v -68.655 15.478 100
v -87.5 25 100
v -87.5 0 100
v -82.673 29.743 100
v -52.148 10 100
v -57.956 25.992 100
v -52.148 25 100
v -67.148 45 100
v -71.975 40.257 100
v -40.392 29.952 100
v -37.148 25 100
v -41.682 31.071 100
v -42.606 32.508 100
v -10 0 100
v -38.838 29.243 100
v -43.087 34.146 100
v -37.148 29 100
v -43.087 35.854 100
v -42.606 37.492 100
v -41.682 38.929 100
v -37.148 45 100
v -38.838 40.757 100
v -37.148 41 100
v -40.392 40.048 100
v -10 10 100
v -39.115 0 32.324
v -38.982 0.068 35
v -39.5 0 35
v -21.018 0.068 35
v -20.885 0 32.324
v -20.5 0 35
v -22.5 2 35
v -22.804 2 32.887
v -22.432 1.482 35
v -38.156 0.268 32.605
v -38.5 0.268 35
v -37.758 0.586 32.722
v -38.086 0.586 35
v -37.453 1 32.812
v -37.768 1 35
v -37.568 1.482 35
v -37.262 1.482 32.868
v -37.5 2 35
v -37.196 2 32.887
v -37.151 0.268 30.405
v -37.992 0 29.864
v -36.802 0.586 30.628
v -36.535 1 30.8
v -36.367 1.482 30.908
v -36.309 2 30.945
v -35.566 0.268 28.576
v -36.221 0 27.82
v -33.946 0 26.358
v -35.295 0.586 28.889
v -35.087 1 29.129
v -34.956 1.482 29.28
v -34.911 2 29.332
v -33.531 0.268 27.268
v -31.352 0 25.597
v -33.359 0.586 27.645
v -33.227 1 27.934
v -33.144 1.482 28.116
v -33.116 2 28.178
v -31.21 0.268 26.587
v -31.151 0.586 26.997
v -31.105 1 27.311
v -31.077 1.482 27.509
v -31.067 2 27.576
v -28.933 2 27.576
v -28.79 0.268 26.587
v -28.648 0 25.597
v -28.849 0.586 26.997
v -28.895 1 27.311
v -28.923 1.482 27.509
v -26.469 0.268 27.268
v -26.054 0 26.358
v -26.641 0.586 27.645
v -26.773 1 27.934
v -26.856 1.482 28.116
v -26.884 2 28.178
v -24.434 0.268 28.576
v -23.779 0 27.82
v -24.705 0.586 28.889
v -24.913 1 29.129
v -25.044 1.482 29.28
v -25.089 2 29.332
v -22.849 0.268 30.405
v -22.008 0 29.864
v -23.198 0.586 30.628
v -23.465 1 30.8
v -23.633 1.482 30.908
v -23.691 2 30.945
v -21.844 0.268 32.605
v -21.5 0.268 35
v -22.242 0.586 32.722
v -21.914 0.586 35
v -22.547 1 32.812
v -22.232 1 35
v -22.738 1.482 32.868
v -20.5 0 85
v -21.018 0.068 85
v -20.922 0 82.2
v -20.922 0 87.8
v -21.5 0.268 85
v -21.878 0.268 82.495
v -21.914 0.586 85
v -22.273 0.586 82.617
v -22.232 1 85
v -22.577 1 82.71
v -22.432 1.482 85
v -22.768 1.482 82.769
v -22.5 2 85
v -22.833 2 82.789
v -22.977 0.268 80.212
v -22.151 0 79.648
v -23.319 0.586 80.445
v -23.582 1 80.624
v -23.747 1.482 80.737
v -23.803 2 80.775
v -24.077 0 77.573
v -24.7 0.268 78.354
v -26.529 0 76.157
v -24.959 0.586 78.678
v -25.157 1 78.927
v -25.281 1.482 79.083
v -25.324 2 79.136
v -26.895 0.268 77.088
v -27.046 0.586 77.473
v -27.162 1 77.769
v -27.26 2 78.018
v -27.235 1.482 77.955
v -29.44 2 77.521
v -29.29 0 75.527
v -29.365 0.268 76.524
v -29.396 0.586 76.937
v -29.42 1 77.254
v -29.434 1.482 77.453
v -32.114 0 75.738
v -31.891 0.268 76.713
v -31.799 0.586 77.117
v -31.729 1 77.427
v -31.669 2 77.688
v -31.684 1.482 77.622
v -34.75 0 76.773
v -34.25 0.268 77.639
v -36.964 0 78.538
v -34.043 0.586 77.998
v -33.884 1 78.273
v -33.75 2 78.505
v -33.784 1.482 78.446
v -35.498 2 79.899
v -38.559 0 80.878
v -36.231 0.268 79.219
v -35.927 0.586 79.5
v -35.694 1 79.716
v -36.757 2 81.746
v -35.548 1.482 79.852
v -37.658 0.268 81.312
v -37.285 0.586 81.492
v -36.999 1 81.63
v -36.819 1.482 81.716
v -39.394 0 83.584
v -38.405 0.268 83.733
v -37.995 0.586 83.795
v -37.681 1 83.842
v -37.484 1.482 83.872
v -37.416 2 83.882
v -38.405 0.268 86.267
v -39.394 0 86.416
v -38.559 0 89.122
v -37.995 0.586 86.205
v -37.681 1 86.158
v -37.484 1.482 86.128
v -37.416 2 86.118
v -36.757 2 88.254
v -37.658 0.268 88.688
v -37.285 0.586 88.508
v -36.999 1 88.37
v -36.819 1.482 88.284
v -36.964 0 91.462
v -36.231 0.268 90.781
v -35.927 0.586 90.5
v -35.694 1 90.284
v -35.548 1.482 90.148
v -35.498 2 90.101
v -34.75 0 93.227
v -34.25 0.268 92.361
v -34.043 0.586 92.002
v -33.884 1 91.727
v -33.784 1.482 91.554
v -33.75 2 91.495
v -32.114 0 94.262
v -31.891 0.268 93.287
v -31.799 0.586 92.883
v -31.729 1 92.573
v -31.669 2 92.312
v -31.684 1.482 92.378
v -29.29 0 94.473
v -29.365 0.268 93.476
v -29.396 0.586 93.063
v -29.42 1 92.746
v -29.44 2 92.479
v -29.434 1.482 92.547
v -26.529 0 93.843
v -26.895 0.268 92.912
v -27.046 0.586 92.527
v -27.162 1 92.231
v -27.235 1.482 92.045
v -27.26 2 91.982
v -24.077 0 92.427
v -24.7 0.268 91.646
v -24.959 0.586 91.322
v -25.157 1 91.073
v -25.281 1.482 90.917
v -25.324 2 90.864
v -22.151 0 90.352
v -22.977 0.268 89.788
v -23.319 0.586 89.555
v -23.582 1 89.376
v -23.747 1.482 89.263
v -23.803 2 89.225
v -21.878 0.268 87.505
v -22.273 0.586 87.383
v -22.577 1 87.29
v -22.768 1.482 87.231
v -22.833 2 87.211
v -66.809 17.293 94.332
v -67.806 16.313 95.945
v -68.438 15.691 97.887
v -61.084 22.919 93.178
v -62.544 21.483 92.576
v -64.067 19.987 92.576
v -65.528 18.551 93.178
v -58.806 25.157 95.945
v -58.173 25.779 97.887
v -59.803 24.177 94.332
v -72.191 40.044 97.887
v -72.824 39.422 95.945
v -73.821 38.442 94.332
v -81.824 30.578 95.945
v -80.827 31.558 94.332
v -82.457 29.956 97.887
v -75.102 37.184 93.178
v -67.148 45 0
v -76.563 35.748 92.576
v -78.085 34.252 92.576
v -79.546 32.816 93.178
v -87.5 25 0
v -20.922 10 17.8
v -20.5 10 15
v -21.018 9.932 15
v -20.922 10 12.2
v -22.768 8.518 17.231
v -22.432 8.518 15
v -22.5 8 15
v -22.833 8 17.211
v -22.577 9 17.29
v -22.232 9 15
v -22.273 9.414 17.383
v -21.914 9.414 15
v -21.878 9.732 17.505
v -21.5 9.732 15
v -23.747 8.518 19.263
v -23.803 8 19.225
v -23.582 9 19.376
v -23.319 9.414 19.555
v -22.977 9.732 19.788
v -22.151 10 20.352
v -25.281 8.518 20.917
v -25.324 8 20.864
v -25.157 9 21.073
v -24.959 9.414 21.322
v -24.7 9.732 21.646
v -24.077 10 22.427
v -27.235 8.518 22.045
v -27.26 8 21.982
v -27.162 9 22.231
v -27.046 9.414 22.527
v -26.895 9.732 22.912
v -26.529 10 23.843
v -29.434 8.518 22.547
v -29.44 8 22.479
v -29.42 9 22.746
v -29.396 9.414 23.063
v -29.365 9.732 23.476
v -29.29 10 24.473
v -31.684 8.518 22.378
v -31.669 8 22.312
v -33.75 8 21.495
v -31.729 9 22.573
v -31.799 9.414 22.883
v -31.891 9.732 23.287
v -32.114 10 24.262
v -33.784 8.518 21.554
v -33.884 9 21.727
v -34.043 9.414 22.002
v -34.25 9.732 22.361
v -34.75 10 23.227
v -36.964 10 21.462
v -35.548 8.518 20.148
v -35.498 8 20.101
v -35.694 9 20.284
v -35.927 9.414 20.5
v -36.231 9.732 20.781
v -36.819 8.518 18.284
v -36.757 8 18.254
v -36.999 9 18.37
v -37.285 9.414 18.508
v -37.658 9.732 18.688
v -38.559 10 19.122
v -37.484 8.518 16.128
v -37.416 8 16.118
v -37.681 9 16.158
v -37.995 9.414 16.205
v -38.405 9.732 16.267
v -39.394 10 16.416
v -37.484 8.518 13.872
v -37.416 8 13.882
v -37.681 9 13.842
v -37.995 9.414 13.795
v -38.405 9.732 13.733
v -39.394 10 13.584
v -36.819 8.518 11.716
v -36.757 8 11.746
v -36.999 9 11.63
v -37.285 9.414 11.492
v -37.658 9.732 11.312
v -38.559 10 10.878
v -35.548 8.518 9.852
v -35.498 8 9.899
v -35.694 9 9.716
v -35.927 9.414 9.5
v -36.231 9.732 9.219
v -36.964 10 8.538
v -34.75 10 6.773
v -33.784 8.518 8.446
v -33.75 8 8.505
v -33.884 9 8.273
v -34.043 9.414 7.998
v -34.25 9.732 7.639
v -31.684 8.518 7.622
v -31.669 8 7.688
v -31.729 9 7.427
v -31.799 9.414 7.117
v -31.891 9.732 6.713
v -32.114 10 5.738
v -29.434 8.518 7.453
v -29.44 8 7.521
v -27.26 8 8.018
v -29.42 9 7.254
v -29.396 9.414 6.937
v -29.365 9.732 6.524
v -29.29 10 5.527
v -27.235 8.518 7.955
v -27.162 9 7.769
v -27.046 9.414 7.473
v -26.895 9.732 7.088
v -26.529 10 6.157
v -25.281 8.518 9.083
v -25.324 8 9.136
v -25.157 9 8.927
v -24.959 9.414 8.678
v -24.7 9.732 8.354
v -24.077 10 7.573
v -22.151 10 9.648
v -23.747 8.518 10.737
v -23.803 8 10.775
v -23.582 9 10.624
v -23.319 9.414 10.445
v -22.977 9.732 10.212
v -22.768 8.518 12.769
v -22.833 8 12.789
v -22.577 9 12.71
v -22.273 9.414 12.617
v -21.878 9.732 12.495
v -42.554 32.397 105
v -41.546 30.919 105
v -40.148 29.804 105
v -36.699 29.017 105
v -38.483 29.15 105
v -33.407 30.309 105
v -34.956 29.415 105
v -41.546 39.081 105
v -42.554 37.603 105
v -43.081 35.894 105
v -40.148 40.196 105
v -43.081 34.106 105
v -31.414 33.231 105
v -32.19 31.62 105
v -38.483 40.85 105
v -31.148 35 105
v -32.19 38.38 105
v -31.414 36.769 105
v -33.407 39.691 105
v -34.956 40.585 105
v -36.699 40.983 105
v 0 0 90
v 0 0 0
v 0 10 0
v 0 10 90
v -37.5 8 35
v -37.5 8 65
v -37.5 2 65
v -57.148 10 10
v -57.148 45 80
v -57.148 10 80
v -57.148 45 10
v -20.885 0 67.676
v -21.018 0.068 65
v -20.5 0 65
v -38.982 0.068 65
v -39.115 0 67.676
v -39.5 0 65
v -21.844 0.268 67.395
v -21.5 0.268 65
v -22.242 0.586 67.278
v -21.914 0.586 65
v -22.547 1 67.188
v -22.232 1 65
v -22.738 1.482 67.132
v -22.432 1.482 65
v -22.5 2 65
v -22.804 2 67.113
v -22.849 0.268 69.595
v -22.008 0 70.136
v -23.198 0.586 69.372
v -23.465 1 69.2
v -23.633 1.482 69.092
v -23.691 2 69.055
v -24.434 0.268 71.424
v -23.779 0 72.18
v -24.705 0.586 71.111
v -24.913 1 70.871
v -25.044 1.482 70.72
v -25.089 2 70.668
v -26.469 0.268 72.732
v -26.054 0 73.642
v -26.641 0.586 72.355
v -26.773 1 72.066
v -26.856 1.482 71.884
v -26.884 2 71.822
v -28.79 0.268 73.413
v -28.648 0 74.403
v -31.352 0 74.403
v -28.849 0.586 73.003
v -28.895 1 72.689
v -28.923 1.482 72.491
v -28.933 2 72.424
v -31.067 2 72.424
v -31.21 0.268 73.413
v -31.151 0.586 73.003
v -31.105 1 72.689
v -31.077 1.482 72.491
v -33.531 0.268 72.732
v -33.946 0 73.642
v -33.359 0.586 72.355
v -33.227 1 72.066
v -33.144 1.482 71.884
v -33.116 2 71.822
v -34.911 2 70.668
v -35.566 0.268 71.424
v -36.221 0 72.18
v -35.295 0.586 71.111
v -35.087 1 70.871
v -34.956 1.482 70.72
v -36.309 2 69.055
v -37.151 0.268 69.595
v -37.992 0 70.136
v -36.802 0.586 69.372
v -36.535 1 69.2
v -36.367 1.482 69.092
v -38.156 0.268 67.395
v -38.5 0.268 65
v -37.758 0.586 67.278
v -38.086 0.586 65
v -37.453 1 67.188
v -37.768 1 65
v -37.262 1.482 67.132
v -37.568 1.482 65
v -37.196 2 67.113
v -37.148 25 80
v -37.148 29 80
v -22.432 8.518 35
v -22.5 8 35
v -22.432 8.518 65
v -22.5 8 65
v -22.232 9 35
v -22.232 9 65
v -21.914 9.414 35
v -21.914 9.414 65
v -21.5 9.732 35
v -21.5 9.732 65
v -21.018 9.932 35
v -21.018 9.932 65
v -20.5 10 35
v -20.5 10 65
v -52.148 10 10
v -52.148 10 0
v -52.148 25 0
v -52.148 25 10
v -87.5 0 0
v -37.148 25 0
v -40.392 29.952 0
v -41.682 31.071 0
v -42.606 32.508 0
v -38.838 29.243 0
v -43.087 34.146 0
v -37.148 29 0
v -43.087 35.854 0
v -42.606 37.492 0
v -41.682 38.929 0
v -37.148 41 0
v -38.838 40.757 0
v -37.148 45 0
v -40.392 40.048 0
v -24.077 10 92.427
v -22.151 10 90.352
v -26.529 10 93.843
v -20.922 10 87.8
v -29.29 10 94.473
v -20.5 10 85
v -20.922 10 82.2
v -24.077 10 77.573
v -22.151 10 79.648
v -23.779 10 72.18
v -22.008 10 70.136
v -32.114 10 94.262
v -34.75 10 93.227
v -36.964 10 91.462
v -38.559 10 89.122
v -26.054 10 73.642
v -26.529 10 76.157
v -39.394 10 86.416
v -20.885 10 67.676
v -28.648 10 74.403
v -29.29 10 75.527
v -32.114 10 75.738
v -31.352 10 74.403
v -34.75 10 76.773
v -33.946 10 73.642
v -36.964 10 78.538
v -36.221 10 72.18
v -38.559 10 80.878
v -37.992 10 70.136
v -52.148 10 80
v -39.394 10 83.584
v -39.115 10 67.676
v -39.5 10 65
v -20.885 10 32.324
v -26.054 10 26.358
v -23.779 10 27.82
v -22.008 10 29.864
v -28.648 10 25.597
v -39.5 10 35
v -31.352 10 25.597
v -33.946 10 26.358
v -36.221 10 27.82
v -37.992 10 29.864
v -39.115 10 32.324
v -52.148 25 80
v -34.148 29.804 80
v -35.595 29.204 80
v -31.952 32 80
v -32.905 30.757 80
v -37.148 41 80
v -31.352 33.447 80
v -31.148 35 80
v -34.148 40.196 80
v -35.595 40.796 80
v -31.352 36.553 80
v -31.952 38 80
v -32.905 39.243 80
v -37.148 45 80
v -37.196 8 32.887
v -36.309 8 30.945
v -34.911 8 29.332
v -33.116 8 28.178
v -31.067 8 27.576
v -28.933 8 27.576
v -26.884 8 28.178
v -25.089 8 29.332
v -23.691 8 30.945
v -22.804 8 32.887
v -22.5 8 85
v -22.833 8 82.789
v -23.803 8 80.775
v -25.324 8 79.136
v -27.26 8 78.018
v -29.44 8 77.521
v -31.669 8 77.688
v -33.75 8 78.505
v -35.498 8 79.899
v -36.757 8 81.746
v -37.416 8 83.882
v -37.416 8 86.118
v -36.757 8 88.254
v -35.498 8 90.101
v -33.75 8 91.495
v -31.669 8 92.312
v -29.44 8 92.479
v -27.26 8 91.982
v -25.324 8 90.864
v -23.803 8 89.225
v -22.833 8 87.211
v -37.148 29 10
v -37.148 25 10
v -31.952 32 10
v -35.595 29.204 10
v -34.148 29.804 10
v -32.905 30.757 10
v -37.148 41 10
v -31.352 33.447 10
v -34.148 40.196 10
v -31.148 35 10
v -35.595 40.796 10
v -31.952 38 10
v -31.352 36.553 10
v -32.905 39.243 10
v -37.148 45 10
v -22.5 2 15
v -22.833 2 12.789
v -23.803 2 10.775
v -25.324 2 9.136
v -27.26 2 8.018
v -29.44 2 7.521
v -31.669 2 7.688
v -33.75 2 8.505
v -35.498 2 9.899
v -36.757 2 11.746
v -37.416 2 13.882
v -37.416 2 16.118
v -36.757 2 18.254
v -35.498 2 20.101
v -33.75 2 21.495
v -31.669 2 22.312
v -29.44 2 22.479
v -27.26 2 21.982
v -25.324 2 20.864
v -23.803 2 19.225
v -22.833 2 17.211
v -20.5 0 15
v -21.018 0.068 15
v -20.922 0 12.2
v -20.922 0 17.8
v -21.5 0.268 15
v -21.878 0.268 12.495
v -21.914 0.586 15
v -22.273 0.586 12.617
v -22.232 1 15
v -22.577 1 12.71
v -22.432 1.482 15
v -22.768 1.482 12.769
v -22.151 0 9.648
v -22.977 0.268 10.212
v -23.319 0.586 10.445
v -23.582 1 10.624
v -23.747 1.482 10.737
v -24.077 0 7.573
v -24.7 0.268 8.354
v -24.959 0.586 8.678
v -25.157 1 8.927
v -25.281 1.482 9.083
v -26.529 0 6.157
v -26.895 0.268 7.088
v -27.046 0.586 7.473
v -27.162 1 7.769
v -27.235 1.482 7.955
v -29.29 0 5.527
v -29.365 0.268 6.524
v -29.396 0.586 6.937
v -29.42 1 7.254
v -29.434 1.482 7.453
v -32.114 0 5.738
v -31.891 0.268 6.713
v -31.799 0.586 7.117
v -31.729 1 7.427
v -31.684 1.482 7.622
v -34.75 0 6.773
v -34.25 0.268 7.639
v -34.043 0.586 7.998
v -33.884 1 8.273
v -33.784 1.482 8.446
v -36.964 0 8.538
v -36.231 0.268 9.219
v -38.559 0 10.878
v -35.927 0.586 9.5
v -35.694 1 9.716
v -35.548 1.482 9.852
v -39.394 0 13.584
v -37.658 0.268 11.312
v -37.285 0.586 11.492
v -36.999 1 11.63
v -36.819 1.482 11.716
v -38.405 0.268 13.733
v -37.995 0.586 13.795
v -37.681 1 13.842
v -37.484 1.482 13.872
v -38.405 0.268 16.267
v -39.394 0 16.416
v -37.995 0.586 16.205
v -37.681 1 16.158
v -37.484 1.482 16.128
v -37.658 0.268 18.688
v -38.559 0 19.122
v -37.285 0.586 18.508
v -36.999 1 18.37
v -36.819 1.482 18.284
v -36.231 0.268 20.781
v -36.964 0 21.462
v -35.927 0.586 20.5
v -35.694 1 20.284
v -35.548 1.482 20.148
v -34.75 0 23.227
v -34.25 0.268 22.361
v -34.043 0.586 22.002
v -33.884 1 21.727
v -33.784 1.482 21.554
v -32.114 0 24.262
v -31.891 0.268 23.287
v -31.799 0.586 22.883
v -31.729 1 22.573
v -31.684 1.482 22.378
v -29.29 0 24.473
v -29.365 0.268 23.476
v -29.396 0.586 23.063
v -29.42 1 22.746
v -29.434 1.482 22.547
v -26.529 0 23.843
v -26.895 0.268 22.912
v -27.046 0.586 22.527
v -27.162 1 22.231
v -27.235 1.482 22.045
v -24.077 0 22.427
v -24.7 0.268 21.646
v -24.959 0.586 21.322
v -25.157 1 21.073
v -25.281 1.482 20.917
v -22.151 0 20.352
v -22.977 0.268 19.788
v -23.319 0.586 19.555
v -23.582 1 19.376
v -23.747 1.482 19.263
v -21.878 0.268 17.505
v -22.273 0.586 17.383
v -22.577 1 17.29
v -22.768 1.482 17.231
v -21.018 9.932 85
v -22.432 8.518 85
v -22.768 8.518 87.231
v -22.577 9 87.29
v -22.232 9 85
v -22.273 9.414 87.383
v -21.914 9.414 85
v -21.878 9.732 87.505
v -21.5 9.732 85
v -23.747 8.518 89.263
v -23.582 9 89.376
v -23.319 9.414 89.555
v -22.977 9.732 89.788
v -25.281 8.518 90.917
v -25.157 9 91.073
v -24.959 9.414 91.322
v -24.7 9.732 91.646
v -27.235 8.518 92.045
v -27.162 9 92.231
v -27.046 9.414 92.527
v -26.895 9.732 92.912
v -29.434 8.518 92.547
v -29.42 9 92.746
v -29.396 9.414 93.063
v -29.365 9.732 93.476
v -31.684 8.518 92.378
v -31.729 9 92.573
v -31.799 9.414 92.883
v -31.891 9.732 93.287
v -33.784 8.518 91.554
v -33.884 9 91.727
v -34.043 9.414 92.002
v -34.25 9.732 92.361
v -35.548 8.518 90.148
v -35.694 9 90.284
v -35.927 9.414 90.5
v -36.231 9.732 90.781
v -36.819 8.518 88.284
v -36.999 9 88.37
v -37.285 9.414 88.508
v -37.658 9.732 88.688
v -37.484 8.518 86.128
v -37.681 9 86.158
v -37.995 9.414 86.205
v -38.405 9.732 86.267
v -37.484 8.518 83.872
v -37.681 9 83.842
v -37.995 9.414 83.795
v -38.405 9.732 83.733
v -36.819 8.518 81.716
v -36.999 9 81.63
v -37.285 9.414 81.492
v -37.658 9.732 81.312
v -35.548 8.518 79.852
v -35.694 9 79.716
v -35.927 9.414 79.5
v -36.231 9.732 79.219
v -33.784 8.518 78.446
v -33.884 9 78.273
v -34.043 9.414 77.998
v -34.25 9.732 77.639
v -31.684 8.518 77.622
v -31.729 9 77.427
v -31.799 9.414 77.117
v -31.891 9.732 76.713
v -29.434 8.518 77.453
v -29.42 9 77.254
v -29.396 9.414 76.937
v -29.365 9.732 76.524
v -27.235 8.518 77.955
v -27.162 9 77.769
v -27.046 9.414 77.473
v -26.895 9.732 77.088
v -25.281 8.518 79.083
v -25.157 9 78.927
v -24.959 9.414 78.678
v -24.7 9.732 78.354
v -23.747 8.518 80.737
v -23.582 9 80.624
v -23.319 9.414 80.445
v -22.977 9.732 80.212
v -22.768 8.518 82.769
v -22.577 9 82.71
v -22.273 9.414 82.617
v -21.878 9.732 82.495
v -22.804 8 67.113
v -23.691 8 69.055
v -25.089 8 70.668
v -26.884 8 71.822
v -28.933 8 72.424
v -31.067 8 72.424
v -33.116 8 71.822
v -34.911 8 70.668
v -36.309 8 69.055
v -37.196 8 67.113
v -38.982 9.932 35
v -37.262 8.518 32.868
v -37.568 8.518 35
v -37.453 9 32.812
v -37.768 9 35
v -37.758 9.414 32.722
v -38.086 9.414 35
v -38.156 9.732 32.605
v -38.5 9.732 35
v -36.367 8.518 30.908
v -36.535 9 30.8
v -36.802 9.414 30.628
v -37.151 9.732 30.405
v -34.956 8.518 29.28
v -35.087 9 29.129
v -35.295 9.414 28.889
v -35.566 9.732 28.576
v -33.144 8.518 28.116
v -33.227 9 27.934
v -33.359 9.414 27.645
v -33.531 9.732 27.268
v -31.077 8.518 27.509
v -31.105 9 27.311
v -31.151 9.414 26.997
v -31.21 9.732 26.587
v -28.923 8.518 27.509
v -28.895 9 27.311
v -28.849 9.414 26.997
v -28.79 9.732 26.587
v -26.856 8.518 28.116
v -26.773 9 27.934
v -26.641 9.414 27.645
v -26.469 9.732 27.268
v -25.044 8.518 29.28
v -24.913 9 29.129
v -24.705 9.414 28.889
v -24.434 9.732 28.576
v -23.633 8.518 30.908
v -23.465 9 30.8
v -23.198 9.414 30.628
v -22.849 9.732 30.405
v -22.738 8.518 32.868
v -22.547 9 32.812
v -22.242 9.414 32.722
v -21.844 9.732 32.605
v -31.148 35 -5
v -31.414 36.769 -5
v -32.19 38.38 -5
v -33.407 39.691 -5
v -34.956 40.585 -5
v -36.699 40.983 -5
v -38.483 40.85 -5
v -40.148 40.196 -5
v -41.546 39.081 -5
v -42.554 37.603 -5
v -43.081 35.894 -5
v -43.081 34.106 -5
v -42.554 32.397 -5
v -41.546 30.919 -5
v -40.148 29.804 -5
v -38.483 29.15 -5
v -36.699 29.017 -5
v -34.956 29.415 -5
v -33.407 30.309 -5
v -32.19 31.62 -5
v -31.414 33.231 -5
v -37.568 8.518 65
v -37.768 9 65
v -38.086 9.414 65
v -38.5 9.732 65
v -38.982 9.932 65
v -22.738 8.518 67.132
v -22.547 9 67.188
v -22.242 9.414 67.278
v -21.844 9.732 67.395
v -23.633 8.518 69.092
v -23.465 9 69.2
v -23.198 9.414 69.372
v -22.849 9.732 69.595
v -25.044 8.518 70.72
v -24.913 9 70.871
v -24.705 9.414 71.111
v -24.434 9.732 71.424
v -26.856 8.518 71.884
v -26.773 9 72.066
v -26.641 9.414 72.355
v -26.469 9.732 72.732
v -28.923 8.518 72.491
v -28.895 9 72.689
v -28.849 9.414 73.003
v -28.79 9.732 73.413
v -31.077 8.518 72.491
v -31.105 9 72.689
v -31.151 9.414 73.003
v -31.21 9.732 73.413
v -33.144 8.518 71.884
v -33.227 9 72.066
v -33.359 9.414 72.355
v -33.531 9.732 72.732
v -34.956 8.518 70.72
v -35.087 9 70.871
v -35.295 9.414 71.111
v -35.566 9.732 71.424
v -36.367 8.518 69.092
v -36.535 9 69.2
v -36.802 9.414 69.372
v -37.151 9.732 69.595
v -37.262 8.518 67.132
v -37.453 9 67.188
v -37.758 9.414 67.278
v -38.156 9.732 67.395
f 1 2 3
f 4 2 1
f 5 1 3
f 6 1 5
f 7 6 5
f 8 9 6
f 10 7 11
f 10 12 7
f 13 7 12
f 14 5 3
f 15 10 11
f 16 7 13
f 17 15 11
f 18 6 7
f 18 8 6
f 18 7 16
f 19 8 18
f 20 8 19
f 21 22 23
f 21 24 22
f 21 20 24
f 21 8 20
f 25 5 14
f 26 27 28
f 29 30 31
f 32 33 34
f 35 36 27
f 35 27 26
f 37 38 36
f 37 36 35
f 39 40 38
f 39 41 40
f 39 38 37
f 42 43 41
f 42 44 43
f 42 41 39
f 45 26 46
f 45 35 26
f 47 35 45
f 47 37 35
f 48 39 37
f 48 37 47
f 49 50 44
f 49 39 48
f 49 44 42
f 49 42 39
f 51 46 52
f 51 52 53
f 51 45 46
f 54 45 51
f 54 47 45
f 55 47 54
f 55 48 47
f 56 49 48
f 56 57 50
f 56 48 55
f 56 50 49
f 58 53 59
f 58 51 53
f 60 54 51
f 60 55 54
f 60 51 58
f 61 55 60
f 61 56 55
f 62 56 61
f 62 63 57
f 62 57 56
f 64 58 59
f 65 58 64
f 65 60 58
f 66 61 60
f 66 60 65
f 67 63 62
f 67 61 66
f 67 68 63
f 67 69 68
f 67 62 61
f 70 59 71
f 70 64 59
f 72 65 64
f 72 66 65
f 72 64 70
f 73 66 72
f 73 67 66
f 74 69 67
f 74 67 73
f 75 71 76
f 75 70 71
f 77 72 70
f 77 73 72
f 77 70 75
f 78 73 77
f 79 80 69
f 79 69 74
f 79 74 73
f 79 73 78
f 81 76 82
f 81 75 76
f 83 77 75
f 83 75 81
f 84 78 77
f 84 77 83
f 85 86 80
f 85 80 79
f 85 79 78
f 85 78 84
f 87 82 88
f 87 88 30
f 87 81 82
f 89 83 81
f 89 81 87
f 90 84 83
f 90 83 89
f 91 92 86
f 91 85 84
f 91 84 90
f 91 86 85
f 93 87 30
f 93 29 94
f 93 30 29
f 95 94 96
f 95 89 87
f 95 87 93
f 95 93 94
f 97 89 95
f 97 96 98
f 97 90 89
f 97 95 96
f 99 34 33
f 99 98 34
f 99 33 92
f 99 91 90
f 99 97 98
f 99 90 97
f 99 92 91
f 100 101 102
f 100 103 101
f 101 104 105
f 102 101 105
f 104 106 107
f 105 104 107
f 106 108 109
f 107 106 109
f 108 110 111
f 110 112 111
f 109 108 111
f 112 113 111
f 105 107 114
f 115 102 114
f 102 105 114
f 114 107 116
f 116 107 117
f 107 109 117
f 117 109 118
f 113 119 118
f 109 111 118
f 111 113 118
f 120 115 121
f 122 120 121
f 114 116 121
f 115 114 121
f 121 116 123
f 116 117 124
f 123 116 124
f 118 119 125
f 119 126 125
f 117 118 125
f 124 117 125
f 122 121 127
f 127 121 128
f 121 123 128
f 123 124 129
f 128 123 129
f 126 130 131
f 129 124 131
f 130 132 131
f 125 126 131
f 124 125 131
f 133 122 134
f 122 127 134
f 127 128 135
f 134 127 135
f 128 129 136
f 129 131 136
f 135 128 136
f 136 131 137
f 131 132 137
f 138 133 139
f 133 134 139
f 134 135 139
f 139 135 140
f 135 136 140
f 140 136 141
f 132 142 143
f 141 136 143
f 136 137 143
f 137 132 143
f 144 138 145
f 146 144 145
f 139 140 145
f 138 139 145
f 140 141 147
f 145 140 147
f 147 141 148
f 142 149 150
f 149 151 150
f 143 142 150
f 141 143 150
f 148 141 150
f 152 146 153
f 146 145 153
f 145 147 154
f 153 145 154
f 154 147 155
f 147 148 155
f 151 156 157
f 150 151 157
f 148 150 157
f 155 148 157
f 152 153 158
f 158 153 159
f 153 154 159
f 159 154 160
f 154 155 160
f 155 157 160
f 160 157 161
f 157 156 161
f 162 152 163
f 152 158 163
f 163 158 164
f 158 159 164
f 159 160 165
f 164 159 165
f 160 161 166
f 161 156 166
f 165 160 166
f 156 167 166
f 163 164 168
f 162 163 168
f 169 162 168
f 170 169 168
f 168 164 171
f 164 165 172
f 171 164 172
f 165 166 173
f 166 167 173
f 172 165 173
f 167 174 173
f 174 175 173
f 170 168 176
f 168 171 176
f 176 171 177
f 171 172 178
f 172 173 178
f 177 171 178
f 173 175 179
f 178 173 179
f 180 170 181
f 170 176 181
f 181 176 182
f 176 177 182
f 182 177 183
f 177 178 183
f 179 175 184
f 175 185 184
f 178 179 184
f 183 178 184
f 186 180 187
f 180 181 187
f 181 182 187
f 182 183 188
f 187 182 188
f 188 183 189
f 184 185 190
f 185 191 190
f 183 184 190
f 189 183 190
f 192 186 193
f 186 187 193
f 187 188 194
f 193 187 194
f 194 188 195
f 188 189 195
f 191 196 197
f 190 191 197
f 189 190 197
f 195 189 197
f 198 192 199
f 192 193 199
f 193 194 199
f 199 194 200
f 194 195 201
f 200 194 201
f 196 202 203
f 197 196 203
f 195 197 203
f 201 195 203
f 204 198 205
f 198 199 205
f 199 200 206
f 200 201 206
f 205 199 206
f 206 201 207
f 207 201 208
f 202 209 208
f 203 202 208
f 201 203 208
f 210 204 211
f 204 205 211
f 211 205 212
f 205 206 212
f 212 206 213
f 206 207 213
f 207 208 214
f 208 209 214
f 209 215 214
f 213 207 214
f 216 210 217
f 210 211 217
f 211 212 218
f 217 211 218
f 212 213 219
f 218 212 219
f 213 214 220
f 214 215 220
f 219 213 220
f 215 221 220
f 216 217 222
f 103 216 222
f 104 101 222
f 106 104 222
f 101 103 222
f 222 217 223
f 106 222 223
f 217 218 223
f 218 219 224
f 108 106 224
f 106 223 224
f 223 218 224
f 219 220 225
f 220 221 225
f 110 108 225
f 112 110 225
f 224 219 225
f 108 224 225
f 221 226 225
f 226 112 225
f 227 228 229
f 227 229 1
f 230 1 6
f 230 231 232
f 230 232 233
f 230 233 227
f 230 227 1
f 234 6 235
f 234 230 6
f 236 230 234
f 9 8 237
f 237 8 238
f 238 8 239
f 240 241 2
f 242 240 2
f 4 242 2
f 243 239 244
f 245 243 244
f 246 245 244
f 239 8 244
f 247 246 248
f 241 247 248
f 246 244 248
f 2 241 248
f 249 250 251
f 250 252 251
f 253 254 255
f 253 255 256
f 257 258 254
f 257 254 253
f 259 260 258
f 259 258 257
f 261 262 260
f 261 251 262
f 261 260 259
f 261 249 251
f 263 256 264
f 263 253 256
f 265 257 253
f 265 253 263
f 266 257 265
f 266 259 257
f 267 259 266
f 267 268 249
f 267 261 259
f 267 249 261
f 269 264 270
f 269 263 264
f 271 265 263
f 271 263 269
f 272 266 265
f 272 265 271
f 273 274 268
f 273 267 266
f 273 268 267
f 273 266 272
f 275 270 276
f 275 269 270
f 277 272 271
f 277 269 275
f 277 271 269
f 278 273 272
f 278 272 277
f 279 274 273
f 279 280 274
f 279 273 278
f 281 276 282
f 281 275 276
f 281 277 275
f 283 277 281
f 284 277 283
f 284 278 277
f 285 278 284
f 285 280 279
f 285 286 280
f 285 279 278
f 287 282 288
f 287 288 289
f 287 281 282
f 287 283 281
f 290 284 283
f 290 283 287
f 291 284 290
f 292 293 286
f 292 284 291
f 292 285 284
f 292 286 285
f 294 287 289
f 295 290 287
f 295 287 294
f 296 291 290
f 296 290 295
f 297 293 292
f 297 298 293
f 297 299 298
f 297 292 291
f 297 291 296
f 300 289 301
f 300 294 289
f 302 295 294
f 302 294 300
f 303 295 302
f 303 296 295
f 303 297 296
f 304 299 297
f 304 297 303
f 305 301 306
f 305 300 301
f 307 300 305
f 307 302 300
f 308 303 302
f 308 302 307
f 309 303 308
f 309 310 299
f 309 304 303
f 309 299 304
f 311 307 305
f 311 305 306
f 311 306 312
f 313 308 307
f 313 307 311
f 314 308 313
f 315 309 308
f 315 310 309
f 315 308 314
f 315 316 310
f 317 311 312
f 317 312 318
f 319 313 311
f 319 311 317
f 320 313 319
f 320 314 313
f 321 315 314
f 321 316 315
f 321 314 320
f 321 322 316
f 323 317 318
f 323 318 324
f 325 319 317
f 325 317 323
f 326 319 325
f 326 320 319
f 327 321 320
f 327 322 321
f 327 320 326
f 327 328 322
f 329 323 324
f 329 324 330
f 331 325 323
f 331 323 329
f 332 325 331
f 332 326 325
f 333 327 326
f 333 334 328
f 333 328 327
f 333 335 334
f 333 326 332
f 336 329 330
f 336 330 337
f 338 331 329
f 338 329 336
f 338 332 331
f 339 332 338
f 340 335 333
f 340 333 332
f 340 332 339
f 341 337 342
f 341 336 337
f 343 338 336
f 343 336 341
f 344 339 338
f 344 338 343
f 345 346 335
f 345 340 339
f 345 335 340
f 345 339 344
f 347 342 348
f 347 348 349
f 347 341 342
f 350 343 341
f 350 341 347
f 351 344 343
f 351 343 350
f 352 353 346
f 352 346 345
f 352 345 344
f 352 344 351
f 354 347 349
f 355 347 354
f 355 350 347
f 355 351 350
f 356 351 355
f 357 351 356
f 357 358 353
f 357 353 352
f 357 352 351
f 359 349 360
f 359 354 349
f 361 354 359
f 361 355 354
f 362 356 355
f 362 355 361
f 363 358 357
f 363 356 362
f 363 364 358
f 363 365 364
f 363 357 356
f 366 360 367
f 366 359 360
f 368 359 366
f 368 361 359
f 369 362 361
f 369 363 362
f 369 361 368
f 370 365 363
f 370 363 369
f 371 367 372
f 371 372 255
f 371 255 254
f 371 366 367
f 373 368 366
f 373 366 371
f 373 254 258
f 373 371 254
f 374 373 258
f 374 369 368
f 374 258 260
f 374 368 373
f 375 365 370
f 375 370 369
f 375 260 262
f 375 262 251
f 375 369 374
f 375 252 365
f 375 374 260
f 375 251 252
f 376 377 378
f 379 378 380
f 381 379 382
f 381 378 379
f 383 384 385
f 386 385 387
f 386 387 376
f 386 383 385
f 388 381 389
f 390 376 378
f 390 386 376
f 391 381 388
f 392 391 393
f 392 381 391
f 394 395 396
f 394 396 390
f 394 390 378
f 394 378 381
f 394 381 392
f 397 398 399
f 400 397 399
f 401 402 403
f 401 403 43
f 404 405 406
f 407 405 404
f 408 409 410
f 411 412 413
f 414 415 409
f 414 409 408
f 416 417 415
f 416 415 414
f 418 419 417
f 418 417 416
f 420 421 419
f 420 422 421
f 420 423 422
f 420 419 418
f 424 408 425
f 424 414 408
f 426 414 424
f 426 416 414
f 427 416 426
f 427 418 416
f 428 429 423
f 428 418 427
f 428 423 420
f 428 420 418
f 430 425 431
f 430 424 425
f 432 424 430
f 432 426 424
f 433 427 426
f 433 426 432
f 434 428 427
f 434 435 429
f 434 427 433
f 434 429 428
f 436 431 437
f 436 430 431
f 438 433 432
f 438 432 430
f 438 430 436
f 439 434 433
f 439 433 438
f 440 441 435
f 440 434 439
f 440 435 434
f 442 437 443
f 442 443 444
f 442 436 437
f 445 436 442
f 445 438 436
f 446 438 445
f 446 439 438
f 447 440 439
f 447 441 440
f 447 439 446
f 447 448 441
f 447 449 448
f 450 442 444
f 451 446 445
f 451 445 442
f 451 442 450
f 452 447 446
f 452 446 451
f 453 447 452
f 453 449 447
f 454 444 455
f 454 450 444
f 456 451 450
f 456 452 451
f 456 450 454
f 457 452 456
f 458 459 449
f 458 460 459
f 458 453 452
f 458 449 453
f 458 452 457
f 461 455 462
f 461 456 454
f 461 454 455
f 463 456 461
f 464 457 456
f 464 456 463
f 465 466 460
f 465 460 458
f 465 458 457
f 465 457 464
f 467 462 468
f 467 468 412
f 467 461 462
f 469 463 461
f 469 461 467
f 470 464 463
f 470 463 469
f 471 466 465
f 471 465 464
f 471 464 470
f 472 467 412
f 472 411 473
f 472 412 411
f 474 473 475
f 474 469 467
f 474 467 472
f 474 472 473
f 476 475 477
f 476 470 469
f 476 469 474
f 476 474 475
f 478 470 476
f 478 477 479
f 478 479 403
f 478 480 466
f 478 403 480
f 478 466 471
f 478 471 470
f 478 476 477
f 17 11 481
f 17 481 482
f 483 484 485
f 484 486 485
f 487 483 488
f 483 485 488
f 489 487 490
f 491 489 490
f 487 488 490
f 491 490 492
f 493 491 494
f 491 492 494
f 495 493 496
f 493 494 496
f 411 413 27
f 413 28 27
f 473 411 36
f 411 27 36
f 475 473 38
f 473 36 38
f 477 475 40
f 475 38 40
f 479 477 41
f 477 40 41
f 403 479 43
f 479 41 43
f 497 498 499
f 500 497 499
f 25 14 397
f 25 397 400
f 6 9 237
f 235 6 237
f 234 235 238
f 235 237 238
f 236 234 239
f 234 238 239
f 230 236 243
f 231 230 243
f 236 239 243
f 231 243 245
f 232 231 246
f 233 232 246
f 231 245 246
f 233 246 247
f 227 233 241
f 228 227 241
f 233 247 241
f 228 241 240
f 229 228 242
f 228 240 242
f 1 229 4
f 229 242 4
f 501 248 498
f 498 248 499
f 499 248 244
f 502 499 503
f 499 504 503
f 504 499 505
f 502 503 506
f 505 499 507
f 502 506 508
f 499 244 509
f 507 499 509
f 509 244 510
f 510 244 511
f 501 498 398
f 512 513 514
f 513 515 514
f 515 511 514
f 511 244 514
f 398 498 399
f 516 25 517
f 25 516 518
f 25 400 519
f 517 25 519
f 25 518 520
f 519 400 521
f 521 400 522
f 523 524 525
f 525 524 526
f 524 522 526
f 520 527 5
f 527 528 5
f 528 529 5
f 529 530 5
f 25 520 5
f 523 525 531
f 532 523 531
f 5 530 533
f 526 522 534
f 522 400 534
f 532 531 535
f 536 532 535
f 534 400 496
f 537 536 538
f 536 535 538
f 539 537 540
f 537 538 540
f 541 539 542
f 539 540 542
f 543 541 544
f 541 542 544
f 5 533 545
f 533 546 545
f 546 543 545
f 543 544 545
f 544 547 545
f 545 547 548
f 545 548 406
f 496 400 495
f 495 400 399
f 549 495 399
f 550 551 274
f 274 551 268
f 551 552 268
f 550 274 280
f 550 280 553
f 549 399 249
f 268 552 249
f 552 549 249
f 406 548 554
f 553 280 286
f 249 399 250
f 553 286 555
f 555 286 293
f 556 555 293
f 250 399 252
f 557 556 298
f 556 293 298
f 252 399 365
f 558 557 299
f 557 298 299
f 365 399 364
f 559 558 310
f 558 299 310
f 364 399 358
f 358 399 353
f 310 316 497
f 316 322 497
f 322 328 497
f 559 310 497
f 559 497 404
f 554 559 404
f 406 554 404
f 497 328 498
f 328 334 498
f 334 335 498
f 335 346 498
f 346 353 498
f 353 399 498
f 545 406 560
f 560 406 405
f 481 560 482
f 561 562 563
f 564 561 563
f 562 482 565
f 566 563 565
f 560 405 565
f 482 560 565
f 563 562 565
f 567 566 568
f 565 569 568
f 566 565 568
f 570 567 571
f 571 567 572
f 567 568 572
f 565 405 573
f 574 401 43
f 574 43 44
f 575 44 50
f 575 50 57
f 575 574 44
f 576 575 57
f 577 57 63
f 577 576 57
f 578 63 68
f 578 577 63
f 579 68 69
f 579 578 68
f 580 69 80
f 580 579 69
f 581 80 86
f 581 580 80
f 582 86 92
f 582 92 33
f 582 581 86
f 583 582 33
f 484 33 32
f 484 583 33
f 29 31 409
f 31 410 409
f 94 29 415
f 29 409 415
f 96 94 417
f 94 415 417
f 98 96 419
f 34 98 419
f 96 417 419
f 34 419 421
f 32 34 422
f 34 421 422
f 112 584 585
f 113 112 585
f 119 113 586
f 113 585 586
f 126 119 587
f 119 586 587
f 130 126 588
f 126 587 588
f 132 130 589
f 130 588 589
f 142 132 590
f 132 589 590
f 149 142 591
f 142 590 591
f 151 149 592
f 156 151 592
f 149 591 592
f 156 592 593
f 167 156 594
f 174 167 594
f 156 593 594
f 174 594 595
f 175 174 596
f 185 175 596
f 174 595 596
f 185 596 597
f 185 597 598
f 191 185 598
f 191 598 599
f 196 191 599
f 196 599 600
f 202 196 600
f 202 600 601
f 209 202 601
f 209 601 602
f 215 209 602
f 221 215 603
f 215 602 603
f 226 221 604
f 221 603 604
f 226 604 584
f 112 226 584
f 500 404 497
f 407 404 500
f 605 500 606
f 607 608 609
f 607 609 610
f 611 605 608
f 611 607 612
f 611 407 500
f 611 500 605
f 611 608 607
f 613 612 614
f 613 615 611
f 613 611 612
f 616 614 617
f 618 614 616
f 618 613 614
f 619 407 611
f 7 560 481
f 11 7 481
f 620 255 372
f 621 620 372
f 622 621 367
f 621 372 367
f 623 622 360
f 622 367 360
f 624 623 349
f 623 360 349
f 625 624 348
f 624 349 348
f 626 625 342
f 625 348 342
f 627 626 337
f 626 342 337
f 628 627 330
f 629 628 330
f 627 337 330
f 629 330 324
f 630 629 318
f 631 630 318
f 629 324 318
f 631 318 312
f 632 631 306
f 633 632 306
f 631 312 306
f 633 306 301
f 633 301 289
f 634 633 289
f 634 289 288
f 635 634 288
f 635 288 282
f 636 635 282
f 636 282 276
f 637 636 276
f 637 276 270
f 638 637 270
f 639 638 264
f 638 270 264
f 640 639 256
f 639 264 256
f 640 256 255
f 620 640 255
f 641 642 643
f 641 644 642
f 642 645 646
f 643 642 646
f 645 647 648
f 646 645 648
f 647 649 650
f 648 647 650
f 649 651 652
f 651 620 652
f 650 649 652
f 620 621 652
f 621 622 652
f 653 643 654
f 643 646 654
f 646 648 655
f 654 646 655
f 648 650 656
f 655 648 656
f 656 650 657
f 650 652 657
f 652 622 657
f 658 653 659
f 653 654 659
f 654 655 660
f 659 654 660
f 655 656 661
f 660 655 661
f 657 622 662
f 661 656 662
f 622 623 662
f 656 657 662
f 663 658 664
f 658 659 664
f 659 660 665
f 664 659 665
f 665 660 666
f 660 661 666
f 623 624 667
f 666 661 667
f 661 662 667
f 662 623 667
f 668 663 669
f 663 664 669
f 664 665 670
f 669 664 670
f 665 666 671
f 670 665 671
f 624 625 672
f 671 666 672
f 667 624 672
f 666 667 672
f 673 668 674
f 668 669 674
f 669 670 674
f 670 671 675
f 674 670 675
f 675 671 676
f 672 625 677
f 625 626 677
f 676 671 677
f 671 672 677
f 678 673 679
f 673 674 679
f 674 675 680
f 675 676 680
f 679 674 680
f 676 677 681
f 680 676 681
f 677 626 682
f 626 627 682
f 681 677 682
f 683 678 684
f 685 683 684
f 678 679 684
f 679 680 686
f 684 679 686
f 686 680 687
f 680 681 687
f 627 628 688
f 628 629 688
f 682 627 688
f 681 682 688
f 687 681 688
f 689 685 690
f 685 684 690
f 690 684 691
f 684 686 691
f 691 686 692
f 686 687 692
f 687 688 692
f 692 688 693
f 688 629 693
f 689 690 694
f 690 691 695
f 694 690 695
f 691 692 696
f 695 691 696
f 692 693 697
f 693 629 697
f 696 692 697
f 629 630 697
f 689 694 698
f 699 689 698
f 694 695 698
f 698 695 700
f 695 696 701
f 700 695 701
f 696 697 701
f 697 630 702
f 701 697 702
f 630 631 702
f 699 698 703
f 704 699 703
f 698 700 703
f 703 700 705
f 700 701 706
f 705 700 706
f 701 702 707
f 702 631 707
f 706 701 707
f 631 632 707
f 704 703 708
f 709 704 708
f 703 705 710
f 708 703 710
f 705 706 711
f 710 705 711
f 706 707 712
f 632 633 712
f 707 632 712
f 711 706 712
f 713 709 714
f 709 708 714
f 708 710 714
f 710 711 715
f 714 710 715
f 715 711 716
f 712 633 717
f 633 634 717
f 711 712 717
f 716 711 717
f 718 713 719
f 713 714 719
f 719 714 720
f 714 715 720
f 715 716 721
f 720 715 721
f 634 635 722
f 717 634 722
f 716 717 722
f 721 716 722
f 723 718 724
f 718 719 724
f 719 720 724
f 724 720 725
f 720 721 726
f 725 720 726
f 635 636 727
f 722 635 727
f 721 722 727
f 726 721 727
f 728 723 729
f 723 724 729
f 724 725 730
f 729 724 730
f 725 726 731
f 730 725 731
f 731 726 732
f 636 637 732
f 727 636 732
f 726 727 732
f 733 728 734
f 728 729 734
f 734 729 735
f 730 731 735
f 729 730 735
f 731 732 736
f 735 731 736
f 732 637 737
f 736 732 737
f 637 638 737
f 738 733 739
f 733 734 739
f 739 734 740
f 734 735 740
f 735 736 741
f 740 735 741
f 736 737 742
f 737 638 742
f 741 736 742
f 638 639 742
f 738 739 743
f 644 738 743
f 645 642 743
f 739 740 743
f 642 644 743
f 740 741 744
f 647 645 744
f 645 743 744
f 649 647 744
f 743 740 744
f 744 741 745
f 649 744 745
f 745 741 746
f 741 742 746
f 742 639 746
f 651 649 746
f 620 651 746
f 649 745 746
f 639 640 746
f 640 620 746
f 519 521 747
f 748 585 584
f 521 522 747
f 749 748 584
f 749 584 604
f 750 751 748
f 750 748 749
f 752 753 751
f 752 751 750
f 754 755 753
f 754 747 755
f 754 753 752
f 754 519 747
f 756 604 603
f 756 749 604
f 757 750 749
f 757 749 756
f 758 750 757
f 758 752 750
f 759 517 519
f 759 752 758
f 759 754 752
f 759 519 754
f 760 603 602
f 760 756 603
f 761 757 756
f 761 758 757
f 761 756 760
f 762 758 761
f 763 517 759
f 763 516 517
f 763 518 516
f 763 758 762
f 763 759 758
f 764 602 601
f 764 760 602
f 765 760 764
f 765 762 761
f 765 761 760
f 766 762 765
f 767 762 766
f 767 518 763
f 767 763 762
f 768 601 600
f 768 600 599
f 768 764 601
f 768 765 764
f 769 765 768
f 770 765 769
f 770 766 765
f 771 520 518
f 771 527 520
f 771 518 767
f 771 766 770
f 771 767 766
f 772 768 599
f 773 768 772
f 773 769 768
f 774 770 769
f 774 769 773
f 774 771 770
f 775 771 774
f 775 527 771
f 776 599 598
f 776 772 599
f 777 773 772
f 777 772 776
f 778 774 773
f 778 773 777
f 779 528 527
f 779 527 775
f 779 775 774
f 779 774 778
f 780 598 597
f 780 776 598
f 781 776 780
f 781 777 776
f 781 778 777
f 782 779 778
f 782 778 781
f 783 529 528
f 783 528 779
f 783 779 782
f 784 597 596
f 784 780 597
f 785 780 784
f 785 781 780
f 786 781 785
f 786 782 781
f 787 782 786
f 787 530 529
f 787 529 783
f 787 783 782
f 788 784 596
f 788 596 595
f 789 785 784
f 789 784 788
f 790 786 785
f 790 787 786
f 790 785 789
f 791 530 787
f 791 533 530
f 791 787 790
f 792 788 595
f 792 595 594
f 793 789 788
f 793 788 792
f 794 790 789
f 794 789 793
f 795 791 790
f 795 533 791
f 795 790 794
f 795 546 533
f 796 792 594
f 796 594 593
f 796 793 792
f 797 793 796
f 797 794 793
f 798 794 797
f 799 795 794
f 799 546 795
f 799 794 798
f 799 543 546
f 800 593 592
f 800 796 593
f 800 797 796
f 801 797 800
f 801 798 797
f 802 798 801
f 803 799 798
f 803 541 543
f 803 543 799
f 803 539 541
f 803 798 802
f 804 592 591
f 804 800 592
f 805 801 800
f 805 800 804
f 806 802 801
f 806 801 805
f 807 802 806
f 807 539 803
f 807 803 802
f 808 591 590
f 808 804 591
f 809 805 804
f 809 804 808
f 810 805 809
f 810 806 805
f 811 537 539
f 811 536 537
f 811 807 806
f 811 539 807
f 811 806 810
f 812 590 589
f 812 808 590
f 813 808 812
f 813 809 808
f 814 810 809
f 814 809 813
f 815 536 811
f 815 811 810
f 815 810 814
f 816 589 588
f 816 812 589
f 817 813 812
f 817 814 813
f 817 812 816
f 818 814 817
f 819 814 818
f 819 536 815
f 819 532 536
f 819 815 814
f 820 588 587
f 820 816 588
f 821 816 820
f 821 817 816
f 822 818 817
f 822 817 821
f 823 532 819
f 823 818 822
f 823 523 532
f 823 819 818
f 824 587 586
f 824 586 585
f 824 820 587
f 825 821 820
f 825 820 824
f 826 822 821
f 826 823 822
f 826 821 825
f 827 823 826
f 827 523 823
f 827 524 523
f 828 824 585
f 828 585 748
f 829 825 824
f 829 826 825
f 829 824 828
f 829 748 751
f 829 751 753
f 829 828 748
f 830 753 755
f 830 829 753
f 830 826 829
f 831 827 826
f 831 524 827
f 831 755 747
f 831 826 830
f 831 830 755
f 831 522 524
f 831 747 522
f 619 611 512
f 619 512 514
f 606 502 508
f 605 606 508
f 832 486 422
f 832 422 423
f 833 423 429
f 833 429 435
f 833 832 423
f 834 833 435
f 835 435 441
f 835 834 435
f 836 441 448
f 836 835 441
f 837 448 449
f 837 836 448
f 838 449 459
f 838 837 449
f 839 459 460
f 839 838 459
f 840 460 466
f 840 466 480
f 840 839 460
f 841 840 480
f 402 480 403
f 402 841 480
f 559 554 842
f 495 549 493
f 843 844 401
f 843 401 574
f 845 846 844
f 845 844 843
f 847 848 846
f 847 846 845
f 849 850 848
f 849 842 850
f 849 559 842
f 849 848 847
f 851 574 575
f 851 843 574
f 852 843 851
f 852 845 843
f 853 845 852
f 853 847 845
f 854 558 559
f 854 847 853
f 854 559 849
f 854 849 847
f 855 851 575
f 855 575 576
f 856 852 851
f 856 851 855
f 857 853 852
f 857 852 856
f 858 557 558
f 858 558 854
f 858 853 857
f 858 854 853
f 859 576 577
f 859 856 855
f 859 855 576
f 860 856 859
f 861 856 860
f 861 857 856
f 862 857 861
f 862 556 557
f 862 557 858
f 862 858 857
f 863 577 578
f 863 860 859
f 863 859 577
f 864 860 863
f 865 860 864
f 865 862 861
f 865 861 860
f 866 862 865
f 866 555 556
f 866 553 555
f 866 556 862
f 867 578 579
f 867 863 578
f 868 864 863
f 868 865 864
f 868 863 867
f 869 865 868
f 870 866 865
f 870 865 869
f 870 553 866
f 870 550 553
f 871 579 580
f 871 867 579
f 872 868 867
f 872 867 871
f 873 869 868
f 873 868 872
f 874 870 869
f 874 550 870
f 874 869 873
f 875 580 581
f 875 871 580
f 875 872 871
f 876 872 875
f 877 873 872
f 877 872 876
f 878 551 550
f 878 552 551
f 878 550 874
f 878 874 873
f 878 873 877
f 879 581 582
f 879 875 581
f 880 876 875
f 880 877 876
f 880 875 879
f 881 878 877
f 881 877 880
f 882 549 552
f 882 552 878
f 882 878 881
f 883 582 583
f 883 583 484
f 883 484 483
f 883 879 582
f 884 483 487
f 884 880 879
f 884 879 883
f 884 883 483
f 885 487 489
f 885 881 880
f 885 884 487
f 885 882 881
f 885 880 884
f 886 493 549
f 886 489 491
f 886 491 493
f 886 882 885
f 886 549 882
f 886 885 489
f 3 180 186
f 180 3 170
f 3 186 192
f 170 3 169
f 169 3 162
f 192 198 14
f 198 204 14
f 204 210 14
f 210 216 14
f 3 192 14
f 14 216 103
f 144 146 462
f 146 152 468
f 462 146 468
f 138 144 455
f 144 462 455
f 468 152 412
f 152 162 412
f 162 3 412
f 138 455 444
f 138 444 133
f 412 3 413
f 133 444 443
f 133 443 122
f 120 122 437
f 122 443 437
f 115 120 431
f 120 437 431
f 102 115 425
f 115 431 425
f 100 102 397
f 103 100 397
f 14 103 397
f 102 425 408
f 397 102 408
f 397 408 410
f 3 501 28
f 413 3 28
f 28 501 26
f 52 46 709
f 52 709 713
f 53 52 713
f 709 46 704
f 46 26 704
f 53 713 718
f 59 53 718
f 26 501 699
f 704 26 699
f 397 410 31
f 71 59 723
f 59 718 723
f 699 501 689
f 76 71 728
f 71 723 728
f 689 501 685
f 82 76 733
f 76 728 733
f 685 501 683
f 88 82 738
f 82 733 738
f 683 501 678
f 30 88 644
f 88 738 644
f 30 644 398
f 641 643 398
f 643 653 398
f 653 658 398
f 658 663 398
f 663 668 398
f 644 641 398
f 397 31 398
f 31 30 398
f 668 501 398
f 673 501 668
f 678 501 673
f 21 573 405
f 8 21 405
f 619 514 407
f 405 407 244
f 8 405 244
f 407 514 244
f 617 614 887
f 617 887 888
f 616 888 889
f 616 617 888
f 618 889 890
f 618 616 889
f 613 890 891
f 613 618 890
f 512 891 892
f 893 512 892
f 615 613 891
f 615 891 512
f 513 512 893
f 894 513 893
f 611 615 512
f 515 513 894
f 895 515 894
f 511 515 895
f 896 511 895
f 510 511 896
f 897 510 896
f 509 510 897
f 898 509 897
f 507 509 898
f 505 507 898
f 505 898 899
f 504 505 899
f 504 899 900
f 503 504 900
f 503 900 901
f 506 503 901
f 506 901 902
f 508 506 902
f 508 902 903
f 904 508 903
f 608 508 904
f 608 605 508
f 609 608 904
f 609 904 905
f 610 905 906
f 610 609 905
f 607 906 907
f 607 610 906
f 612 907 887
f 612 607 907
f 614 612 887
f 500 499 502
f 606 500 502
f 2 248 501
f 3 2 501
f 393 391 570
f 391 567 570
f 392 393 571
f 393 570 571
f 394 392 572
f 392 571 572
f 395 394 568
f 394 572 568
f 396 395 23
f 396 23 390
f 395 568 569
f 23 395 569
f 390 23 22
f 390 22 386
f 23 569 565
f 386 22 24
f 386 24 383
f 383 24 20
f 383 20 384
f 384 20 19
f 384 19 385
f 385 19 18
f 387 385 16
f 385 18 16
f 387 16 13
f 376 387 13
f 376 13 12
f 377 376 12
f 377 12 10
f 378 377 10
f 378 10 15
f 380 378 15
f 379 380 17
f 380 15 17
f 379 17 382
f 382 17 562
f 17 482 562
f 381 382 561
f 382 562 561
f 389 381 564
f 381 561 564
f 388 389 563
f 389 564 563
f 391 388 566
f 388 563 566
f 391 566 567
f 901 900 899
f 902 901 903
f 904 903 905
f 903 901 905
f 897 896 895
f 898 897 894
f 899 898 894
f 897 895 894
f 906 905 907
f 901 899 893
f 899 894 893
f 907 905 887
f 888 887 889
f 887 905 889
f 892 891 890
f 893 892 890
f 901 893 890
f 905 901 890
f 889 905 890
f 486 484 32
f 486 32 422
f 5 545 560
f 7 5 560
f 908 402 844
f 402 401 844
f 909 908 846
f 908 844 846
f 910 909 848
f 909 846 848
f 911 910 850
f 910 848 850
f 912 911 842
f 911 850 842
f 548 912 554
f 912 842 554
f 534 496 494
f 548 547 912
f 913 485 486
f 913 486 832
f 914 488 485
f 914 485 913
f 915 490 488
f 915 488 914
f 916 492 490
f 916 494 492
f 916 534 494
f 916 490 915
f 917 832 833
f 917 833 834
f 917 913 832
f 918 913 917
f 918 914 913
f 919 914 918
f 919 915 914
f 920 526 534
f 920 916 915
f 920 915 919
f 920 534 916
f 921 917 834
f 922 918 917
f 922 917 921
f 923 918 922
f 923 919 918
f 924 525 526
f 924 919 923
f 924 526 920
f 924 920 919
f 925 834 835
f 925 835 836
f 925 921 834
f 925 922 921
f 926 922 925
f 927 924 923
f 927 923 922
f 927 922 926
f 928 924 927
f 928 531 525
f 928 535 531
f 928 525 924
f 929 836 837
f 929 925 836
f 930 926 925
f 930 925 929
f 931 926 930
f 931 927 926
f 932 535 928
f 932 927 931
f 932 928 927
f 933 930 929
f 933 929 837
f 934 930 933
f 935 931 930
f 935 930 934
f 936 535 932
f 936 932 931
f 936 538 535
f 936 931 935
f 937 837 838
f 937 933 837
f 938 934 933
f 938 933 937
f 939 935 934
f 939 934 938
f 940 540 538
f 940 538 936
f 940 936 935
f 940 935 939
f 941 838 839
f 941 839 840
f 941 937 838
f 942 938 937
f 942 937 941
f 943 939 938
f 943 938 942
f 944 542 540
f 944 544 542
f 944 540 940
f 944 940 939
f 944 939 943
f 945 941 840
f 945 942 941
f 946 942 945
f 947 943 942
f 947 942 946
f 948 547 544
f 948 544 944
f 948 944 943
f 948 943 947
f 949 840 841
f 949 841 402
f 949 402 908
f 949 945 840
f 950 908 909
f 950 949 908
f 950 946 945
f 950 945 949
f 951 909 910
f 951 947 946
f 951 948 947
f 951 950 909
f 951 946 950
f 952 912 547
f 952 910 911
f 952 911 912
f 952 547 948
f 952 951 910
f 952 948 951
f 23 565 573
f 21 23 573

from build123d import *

# Parameters (mm, degrees)
BOSS_EXTRUDE1_DEPTH      = 100
SKETCH2_R                = 6
BOSS_EXTRUDE3_DEPTH      = 5
BOSS_EXTRUDE3_DEPTH_BACK = 105
SKETCH3_W                = 26
SKETCH3_H                = 70
CUT_EXTRUDE2_DEPTH       = 35
SKETCH4_R                = 7.5
CUT_EXTRUDE3_DEPTH       = 10
CUT_EXTRUDE4_DEPTH       = 20
CHAMFER1_SIZE            = 10
FILLET1_R                = 2


with BuildPart() as part:
    # Sketch1 → Boss-Extrude1 (new body)
    with BuildSketch(Plane.XY):
        Polygon((-87.5, 0), (0, 0), (0, 10), (-52.147852141, 10), (-52.147852141, 25), (-37.147852141, 25), (-37.147852141, 45), (-67.147852141, 45), (-87.5, 25), align=None)
    extrude(amount=BOSS_EXTRUDE1_DEPTH)

    # Sketch2 → Boss-Extrude3 (add, two sides)
    with BuildSketch(Plane.XY.offset(100)) as boss_extrude3_sk:
        with Locations((-37.147852141, 35)):
            Circle(SKETCH2_R)
    extrude(amount=BOSS_EXTRUDE3_DEPTH)
    extrude(boss_extrude3_sk.sketch, amount=-BOSS_EXTRUDE3_DEPTH_BACK)

    # Sketch3 → Cut-Extrude2 (cut)
    with BuildSketch(Plane(origin=(0, 45, 0), x_dir=(1, 0, 0), z_dir=(0, 1, 0))):
        with Locations((-44.147852141, -45)):
            Rectangle(SKETCH3_W, SKETCH3_H)
    extrude(amount=-CUT_EXTRUDE2_DEPTH, mode=Mode.SUBTRACT)

    # Sketch4 → Cut-Extrude3 (cut)
    with BuildSketch(Plane(origin=(0, 10, 0), x_dir=(1, 0, 0), z_dir=(0, 1, 0))):
        with Locations((-30, -85)):
            Circle(SKETCH4_R)
        with Locations((-30, -15)):
            Circle(SKETCH4_R)
        with BuildLine():
            Line((-37.5, -65), (-37.5, -35))
            ThreePointArc((-37.5, -35), (-30, -27.5), (-22.5, -35))
            Line((-22.5, -35), (-22.5, -65))
            ThreePointArc((-22.5, -65), (-30, -72.5), (-37.5, -65))
        make_face()
    extrude(amount=-CUT_EXTRUDE3_DEPTH, mode=Mode.SUBTRACT)

    # Sketch5 → Cut-Extrude4 (cut)
    with BuildSketch(Plane(origin=(-55.484553408, 56.461491744, 0), x_dir=(0.713250449, 0.700909264, 0), z_dir=(-0.700909264, 0.713250449, 0))):
        with BuildLine():
            Line((-38.119500749, -100), (-23.119500749, -100))
            ThreePointArc((-23.119500749, -100), (-30.619500749, -92.5), (-38.119500749, -100))
        make_face()
    extrude(amount=-CUT_EXTRUDE4_DEPTH, mode=Mode.SUBTRACT)

    # Chamfer1
    chamfer1_edges = [part.edges().sort_by_distance(p)[0] for p in [
        (0, 5, 100),
    ]]
    chamfer(chamfer1_edges, length=CHAMFER1_SIZE)

    # Fillet1
    fillet1_edges = [part.edges().sort_by_distance(p)[0] for p in [
        (-37.5, 10, 85),
        (-37.5, 0, 85),
        (-37.5, 10, 15),
        (-37.5, 0, 15),
        (-30, 10, 72.5),
        (-22.5, 10, 50),
        (-30, 10, 27.5),
        (-37.5, 10, 50),
        (-30, 0, 72.5),
        (-37.5, 0, 50),
        (-30, 0, 27.5),
        (-22.5, 0, 50),
    ]]
    fillet(fillet1_edges, radius=FILLET1_R)


solid = part.part
